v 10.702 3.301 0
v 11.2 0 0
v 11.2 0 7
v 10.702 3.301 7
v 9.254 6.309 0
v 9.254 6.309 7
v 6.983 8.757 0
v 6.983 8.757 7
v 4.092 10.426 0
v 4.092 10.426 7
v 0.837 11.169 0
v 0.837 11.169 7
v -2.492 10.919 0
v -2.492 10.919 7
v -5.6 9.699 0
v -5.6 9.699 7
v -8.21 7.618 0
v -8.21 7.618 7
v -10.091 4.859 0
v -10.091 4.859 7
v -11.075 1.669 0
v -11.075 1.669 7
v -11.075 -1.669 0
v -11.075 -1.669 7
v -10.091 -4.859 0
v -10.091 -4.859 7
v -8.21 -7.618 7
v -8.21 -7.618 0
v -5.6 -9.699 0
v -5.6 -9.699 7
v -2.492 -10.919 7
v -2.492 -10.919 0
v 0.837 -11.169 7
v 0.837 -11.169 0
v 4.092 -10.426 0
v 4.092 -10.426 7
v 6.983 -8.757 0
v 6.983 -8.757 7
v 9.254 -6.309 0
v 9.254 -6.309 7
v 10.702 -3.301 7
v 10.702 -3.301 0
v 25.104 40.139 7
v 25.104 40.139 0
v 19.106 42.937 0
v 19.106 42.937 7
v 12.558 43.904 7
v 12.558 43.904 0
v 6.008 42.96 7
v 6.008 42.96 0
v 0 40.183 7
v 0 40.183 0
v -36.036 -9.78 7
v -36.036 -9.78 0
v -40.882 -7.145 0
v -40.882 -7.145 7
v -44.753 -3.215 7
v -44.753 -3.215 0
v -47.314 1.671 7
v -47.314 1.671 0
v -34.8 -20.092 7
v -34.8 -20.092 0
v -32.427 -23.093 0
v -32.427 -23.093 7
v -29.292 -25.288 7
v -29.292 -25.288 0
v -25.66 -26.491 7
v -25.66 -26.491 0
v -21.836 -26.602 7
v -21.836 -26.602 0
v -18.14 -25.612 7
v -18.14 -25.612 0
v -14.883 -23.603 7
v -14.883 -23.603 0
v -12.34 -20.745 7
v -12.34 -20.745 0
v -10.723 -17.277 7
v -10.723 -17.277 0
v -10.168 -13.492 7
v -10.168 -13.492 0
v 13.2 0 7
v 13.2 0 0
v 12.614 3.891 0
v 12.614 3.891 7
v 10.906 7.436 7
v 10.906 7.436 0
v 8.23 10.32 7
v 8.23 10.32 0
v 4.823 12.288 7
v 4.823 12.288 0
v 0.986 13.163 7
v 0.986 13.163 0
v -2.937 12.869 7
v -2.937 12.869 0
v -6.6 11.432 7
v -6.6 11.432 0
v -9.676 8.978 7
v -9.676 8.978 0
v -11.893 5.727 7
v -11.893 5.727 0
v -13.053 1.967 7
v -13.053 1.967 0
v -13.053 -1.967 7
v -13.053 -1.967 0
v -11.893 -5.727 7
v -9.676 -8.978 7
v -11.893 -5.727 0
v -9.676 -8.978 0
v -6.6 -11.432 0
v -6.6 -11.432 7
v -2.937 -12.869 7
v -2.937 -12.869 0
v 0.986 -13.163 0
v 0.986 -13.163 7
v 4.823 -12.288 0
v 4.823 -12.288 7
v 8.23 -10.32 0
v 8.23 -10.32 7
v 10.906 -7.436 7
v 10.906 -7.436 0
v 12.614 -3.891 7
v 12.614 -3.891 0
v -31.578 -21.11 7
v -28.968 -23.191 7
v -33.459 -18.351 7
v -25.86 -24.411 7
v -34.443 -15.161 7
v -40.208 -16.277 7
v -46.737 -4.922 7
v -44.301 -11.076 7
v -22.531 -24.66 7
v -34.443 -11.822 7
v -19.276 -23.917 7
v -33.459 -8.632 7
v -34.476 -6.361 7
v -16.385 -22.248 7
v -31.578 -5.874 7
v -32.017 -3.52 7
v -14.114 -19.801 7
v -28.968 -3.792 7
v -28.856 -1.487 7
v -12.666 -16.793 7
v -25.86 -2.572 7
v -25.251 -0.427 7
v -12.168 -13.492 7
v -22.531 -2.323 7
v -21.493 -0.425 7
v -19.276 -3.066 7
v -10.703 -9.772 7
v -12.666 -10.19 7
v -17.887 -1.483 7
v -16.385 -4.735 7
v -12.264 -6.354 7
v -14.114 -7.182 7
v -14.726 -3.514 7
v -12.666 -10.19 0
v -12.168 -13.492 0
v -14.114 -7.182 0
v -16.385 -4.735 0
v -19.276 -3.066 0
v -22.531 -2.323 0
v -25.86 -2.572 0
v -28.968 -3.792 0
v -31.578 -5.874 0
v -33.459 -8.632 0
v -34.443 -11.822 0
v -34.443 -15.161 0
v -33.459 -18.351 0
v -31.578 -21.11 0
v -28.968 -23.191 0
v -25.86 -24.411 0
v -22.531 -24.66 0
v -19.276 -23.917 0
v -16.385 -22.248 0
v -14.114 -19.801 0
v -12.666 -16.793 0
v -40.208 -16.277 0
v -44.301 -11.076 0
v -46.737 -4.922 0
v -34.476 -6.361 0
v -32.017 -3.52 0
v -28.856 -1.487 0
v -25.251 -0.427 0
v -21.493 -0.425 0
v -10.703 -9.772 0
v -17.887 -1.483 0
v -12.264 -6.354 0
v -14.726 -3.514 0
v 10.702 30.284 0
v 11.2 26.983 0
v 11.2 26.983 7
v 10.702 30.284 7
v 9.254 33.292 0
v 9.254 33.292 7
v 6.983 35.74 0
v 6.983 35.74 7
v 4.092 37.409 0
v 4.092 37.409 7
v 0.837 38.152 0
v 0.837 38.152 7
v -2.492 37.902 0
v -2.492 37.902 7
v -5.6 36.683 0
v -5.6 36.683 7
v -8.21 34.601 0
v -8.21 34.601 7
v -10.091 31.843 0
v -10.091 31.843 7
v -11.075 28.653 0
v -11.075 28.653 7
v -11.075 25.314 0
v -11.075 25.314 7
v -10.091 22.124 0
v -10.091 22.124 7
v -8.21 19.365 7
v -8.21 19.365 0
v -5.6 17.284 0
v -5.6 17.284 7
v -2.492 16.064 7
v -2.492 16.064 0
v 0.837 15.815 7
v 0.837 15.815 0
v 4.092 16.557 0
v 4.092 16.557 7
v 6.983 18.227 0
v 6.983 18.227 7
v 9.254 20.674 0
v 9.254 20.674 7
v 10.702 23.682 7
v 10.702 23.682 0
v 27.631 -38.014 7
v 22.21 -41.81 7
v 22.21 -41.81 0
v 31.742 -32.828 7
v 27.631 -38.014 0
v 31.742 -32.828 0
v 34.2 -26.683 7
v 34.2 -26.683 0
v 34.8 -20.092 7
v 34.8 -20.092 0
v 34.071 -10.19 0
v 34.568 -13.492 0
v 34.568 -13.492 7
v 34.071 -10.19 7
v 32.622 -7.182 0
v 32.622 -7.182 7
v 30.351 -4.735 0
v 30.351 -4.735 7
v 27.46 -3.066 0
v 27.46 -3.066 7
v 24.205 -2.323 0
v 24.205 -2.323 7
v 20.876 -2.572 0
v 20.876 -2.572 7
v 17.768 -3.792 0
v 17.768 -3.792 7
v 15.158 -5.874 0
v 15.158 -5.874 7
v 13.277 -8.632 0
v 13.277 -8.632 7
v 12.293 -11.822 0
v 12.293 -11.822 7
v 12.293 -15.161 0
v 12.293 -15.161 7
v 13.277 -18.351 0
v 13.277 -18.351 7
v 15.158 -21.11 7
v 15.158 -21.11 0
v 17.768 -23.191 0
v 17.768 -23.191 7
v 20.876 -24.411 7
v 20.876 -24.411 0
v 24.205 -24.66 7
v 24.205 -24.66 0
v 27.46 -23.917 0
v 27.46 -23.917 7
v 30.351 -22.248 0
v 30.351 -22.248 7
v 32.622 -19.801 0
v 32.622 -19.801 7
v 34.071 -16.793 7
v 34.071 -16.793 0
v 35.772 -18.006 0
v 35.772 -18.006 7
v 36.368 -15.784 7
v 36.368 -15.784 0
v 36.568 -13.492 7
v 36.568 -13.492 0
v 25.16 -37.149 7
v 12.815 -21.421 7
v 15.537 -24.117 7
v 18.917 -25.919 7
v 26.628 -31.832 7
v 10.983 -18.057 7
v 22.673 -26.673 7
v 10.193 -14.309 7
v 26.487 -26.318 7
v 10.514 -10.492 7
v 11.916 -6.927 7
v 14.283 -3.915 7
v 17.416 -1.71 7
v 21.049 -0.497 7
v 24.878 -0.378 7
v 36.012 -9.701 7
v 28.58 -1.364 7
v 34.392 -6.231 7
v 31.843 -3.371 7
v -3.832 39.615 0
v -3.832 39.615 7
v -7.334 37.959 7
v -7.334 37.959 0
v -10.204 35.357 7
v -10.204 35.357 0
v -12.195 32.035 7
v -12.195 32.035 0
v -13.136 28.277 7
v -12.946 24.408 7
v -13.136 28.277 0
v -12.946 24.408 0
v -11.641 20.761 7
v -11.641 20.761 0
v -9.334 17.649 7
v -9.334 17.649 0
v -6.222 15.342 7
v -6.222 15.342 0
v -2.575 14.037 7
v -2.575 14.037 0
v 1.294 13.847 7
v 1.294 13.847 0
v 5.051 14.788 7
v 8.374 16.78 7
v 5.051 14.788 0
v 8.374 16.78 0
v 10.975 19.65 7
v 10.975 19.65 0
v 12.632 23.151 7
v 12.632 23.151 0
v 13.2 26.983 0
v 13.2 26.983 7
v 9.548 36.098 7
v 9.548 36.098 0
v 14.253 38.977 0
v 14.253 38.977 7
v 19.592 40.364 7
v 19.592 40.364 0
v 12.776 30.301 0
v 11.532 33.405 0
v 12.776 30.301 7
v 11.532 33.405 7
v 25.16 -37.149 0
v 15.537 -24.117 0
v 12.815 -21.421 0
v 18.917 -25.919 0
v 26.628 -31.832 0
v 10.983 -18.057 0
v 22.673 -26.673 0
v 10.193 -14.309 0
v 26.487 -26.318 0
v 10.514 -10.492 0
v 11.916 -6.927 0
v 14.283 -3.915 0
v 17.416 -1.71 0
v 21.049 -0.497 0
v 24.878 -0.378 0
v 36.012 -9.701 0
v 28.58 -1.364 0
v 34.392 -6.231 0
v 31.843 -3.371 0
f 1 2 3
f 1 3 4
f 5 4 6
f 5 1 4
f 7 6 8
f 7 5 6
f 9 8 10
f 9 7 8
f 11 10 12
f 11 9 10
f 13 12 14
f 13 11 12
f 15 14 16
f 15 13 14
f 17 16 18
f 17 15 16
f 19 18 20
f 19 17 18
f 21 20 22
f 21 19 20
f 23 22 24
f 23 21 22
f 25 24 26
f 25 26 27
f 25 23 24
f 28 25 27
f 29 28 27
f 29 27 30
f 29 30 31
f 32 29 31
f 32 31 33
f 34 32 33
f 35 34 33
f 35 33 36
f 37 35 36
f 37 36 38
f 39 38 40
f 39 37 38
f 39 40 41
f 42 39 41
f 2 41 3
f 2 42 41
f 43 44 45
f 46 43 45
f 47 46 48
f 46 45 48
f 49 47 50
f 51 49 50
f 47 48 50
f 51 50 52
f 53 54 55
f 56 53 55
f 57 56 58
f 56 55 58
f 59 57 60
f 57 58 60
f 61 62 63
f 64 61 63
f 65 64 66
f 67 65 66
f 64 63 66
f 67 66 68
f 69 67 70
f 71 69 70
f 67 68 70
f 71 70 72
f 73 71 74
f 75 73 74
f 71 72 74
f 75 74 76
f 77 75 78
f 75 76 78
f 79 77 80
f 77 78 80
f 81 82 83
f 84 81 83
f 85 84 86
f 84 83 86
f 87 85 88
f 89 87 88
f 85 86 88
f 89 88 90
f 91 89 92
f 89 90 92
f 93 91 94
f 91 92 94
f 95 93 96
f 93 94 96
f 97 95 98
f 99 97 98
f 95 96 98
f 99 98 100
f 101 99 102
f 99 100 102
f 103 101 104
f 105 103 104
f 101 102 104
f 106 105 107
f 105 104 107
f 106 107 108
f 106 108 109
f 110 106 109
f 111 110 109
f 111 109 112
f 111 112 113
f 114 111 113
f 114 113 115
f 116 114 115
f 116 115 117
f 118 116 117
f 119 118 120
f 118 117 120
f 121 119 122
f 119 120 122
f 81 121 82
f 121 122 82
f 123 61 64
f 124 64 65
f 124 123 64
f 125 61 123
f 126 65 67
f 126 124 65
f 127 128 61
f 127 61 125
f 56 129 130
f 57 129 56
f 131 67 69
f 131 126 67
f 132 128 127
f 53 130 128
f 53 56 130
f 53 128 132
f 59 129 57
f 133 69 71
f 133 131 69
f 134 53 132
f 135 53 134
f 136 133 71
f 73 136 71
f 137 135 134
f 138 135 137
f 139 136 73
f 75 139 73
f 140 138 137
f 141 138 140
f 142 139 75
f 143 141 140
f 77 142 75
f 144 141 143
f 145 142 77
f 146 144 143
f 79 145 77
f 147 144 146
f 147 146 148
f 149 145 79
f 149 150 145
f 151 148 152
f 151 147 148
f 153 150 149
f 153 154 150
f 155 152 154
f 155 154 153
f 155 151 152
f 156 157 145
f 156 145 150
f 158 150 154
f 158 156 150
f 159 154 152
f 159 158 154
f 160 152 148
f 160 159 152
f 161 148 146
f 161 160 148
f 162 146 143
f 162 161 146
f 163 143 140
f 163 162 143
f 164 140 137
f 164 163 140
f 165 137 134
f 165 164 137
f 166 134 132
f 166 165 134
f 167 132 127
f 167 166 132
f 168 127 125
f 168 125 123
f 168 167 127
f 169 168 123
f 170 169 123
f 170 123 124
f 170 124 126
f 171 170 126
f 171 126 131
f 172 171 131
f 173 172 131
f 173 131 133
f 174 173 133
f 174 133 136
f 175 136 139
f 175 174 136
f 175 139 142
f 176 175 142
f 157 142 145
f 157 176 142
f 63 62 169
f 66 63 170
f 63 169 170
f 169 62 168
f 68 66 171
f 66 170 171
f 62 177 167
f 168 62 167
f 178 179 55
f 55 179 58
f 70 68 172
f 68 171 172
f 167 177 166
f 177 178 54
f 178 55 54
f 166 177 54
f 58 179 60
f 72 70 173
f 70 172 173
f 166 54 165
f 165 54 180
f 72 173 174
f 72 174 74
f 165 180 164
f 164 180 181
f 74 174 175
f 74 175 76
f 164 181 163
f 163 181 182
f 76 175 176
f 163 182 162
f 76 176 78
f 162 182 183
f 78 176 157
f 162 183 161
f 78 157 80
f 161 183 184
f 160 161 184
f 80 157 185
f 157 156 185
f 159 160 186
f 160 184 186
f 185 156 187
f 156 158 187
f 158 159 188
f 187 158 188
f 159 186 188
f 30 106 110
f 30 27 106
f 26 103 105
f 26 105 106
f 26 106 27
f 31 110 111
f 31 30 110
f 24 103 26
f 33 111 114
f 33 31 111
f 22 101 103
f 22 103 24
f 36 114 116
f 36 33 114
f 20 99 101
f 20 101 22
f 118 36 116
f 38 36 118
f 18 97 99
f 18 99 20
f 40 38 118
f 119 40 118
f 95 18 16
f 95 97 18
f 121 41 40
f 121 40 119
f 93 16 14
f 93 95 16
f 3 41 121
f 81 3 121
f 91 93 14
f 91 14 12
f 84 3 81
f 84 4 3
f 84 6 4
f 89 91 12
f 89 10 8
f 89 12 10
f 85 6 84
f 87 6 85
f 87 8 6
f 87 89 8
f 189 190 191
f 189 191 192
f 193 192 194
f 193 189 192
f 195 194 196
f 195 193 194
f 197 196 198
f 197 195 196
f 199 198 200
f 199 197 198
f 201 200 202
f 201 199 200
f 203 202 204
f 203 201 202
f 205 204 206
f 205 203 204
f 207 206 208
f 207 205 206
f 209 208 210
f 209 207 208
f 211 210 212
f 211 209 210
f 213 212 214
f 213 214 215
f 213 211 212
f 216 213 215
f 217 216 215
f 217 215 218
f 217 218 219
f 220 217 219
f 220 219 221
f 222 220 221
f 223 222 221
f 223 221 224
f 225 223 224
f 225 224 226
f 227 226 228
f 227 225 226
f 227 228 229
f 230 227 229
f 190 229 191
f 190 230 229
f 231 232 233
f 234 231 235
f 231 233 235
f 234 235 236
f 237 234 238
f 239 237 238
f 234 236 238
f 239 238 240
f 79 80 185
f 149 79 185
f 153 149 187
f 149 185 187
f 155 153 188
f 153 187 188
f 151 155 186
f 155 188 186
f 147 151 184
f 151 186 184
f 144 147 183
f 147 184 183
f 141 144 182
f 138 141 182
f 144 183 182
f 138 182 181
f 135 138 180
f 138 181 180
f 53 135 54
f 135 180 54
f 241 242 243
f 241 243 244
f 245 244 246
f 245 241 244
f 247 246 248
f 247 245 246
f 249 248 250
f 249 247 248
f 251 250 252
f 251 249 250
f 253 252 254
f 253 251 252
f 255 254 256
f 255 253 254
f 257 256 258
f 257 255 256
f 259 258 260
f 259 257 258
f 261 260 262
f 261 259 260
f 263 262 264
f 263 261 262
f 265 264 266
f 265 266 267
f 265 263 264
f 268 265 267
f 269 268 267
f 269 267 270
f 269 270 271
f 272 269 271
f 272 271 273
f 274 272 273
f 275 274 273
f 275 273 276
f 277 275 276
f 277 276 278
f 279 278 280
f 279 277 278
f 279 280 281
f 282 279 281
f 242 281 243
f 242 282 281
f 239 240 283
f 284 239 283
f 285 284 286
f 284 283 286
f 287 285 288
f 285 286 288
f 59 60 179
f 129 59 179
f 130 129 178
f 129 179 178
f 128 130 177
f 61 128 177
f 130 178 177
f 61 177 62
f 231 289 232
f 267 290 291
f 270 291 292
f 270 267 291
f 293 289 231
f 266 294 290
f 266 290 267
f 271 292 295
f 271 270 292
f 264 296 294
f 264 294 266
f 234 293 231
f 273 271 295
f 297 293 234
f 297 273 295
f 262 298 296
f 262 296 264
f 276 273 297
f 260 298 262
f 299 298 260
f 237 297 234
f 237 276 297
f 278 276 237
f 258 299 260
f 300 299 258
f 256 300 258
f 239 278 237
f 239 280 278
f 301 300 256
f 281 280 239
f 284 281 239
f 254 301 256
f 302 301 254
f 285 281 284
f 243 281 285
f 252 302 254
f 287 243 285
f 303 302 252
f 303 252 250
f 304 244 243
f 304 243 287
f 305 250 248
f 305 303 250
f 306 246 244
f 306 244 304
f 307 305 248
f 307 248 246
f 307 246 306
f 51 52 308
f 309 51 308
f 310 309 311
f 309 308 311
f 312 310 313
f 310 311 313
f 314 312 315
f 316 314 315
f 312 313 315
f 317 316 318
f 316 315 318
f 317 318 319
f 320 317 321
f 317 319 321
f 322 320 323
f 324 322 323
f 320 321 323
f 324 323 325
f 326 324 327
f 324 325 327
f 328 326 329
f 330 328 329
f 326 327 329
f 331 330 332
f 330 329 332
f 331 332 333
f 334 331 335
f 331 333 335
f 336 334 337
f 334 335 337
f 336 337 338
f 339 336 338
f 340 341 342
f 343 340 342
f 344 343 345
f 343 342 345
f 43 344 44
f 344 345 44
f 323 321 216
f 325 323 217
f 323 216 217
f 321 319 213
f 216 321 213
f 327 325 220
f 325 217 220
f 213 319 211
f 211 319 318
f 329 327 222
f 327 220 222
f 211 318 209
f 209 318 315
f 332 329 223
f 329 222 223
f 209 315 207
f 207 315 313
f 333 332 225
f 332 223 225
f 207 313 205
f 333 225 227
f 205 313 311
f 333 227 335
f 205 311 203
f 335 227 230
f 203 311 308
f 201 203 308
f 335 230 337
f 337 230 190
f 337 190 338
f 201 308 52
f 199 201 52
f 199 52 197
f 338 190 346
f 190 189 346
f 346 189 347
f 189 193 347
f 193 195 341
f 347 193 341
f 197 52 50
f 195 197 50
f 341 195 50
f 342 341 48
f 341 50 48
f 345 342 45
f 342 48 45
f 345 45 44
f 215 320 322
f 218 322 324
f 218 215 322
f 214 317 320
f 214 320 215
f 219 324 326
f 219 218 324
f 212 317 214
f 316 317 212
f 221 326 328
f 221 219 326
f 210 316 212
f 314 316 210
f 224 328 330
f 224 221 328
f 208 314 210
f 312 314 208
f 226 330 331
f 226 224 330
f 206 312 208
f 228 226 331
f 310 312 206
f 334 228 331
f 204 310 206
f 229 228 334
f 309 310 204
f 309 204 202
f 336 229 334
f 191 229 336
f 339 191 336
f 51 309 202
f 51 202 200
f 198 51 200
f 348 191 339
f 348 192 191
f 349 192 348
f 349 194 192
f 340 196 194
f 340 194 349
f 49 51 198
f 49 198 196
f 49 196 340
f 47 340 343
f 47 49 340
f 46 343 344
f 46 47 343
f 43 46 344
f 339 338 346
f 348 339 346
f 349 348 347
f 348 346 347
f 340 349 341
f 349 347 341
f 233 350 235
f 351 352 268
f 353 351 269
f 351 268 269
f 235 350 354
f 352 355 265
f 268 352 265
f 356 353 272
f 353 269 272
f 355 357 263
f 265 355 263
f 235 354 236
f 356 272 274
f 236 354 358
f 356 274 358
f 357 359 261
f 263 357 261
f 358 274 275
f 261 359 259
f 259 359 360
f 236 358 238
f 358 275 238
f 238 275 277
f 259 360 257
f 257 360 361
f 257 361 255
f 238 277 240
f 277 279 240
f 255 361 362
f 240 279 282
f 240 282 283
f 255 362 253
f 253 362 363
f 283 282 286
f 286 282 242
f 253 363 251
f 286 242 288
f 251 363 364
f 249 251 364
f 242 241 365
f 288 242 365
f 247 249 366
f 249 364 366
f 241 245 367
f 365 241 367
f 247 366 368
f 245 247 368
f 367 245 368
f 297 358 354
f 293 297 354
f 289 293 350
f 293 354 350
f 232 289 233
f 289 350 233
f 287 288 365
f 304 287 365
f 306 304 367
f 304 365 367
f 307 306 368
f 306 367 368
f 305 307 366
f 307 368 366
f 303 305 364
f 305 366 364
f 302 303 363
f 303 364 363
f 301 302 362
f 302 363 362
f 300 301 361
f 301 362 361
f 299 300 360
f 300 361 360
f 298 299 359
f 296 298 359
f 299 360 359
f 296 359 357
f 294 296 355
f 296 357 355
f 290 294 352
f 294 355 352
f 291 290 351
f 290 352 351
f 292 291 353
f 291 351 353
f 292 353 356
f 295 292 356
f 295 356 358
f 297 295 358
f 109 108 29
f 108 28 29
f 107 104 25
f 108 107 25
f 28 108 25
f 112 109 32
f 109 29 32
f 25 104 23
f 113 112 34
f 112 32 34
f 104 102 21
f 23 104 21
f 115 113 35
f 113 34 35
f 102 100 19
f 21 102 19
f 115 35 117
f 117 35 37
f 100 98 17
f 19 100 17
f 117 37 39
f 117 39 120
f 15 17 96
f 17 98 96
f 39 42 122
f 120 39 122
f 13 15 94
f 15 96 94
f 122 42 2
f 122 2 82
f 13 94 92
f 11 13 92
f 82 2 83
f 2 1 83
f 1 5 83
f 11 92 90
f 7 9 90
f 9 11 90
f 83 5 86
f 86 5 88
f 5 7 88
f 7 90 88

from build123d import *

# Parameters (mm, degrees)
F0_R     = 11.2
F0_R_2   = 13.2
F1_DEPTH = 7


with BuildPart() as f1:
    # F0 (on Top) → F1 (new body)
    with BuildSketch(Plane.XY):
        with BuildLine():
            ThreePointArc((0, 40.183239), (-9.33381, 17.649429), (13.2, 26.983239))
            ThreePointArc((13.2, 26.983239), (12.253106, 31.892556), (9.548274, 36.097539))
            ThreePointArc((9.548274, 36.097539), (5.192843, 39.118904), (0, 40.183239))
        make_face()
        with Locations((0, 26.983239)):
            Circle(F0_R, mode=Mode.SUBTRACT)
        with BuildLine():
            ThreePointArc((34.799706, -20.091619), (36.118391, -16.908031), (36.56817, -13.491619))
            ThreePointArc((36.56817, -13.491619), (12.990024, -5.334777), (26.487249, -26.317817))
            ThreePointArc((26.487249, -26.317817), (31.281543, -24.056586), (34.799706, -20.091619))
        make_face()
        with Locations((23.36817, -13.491619)):
            Circle(F0_R, mode=Mode.SUBTRACT)
        with BuildLine():
            ThreePointArc((0, 40.183239), (5.192843, 39.118904), (9.548274, 36.097539))
            ThreePointArc((9.548274, 36.097539), (16.871486, 39.86786), (25.103807, 40.139247))
            ThreePointArc((25.103807, 40.139247), (12.558462, 43.903601), (0, 40.183239))
        make_face()
        with BuildLine():
            ThreePointArc((-34.799706, -20.091619), (-19.951759, -26.24184), (-10.16817, -13.491619))
            ThreePointArc((-10.16817, -13.491619), (-21.49321, -0.42546), (-36.035523, -9.779722))
            ThreePointArc((-36.035523, -9.779722), (-36.474387, -15.062318), (-34.799706, -20.091619))
        make_face()
        with Locations((-23.36817, -13.491619)):
            Circle(F0_R, mode=Mode.SUBTRACT)
        with BuildLine():
            ThreePointArc((-34.799706, -20.091619), (-36.474387, -15.062318), (-36.035523, -9.779722))
            ThreePointArc((-36.035523, -9.779722), (-42.962323, -5.322795), (-47.313511, 1.670912))
            ThreePointArc((-47.313511, 1.670912), (-44.300864, -11.075853), (-34.799706, -20.091619))
        make_face()
        with BuildLine():
            ThreePointArc((34.799706, -20.091619), (31.281543, -24.056586), (26.487249, -26.317817))
            ThreePointArc((26.487249, -26.317817), (26.090837, -34.545066), (22.209704, -41.810158))
            ThreePointArc((22.209704, -41.810158), (31.742402, -32.827747), (34.799706, -20.091619))
        make_face()
        Circle(F0_R_2)
        Circle(F0_R, mode=Mode.SUBTRACT)
    extrude(amount=F1_DEPTH)


solid = f1.part
